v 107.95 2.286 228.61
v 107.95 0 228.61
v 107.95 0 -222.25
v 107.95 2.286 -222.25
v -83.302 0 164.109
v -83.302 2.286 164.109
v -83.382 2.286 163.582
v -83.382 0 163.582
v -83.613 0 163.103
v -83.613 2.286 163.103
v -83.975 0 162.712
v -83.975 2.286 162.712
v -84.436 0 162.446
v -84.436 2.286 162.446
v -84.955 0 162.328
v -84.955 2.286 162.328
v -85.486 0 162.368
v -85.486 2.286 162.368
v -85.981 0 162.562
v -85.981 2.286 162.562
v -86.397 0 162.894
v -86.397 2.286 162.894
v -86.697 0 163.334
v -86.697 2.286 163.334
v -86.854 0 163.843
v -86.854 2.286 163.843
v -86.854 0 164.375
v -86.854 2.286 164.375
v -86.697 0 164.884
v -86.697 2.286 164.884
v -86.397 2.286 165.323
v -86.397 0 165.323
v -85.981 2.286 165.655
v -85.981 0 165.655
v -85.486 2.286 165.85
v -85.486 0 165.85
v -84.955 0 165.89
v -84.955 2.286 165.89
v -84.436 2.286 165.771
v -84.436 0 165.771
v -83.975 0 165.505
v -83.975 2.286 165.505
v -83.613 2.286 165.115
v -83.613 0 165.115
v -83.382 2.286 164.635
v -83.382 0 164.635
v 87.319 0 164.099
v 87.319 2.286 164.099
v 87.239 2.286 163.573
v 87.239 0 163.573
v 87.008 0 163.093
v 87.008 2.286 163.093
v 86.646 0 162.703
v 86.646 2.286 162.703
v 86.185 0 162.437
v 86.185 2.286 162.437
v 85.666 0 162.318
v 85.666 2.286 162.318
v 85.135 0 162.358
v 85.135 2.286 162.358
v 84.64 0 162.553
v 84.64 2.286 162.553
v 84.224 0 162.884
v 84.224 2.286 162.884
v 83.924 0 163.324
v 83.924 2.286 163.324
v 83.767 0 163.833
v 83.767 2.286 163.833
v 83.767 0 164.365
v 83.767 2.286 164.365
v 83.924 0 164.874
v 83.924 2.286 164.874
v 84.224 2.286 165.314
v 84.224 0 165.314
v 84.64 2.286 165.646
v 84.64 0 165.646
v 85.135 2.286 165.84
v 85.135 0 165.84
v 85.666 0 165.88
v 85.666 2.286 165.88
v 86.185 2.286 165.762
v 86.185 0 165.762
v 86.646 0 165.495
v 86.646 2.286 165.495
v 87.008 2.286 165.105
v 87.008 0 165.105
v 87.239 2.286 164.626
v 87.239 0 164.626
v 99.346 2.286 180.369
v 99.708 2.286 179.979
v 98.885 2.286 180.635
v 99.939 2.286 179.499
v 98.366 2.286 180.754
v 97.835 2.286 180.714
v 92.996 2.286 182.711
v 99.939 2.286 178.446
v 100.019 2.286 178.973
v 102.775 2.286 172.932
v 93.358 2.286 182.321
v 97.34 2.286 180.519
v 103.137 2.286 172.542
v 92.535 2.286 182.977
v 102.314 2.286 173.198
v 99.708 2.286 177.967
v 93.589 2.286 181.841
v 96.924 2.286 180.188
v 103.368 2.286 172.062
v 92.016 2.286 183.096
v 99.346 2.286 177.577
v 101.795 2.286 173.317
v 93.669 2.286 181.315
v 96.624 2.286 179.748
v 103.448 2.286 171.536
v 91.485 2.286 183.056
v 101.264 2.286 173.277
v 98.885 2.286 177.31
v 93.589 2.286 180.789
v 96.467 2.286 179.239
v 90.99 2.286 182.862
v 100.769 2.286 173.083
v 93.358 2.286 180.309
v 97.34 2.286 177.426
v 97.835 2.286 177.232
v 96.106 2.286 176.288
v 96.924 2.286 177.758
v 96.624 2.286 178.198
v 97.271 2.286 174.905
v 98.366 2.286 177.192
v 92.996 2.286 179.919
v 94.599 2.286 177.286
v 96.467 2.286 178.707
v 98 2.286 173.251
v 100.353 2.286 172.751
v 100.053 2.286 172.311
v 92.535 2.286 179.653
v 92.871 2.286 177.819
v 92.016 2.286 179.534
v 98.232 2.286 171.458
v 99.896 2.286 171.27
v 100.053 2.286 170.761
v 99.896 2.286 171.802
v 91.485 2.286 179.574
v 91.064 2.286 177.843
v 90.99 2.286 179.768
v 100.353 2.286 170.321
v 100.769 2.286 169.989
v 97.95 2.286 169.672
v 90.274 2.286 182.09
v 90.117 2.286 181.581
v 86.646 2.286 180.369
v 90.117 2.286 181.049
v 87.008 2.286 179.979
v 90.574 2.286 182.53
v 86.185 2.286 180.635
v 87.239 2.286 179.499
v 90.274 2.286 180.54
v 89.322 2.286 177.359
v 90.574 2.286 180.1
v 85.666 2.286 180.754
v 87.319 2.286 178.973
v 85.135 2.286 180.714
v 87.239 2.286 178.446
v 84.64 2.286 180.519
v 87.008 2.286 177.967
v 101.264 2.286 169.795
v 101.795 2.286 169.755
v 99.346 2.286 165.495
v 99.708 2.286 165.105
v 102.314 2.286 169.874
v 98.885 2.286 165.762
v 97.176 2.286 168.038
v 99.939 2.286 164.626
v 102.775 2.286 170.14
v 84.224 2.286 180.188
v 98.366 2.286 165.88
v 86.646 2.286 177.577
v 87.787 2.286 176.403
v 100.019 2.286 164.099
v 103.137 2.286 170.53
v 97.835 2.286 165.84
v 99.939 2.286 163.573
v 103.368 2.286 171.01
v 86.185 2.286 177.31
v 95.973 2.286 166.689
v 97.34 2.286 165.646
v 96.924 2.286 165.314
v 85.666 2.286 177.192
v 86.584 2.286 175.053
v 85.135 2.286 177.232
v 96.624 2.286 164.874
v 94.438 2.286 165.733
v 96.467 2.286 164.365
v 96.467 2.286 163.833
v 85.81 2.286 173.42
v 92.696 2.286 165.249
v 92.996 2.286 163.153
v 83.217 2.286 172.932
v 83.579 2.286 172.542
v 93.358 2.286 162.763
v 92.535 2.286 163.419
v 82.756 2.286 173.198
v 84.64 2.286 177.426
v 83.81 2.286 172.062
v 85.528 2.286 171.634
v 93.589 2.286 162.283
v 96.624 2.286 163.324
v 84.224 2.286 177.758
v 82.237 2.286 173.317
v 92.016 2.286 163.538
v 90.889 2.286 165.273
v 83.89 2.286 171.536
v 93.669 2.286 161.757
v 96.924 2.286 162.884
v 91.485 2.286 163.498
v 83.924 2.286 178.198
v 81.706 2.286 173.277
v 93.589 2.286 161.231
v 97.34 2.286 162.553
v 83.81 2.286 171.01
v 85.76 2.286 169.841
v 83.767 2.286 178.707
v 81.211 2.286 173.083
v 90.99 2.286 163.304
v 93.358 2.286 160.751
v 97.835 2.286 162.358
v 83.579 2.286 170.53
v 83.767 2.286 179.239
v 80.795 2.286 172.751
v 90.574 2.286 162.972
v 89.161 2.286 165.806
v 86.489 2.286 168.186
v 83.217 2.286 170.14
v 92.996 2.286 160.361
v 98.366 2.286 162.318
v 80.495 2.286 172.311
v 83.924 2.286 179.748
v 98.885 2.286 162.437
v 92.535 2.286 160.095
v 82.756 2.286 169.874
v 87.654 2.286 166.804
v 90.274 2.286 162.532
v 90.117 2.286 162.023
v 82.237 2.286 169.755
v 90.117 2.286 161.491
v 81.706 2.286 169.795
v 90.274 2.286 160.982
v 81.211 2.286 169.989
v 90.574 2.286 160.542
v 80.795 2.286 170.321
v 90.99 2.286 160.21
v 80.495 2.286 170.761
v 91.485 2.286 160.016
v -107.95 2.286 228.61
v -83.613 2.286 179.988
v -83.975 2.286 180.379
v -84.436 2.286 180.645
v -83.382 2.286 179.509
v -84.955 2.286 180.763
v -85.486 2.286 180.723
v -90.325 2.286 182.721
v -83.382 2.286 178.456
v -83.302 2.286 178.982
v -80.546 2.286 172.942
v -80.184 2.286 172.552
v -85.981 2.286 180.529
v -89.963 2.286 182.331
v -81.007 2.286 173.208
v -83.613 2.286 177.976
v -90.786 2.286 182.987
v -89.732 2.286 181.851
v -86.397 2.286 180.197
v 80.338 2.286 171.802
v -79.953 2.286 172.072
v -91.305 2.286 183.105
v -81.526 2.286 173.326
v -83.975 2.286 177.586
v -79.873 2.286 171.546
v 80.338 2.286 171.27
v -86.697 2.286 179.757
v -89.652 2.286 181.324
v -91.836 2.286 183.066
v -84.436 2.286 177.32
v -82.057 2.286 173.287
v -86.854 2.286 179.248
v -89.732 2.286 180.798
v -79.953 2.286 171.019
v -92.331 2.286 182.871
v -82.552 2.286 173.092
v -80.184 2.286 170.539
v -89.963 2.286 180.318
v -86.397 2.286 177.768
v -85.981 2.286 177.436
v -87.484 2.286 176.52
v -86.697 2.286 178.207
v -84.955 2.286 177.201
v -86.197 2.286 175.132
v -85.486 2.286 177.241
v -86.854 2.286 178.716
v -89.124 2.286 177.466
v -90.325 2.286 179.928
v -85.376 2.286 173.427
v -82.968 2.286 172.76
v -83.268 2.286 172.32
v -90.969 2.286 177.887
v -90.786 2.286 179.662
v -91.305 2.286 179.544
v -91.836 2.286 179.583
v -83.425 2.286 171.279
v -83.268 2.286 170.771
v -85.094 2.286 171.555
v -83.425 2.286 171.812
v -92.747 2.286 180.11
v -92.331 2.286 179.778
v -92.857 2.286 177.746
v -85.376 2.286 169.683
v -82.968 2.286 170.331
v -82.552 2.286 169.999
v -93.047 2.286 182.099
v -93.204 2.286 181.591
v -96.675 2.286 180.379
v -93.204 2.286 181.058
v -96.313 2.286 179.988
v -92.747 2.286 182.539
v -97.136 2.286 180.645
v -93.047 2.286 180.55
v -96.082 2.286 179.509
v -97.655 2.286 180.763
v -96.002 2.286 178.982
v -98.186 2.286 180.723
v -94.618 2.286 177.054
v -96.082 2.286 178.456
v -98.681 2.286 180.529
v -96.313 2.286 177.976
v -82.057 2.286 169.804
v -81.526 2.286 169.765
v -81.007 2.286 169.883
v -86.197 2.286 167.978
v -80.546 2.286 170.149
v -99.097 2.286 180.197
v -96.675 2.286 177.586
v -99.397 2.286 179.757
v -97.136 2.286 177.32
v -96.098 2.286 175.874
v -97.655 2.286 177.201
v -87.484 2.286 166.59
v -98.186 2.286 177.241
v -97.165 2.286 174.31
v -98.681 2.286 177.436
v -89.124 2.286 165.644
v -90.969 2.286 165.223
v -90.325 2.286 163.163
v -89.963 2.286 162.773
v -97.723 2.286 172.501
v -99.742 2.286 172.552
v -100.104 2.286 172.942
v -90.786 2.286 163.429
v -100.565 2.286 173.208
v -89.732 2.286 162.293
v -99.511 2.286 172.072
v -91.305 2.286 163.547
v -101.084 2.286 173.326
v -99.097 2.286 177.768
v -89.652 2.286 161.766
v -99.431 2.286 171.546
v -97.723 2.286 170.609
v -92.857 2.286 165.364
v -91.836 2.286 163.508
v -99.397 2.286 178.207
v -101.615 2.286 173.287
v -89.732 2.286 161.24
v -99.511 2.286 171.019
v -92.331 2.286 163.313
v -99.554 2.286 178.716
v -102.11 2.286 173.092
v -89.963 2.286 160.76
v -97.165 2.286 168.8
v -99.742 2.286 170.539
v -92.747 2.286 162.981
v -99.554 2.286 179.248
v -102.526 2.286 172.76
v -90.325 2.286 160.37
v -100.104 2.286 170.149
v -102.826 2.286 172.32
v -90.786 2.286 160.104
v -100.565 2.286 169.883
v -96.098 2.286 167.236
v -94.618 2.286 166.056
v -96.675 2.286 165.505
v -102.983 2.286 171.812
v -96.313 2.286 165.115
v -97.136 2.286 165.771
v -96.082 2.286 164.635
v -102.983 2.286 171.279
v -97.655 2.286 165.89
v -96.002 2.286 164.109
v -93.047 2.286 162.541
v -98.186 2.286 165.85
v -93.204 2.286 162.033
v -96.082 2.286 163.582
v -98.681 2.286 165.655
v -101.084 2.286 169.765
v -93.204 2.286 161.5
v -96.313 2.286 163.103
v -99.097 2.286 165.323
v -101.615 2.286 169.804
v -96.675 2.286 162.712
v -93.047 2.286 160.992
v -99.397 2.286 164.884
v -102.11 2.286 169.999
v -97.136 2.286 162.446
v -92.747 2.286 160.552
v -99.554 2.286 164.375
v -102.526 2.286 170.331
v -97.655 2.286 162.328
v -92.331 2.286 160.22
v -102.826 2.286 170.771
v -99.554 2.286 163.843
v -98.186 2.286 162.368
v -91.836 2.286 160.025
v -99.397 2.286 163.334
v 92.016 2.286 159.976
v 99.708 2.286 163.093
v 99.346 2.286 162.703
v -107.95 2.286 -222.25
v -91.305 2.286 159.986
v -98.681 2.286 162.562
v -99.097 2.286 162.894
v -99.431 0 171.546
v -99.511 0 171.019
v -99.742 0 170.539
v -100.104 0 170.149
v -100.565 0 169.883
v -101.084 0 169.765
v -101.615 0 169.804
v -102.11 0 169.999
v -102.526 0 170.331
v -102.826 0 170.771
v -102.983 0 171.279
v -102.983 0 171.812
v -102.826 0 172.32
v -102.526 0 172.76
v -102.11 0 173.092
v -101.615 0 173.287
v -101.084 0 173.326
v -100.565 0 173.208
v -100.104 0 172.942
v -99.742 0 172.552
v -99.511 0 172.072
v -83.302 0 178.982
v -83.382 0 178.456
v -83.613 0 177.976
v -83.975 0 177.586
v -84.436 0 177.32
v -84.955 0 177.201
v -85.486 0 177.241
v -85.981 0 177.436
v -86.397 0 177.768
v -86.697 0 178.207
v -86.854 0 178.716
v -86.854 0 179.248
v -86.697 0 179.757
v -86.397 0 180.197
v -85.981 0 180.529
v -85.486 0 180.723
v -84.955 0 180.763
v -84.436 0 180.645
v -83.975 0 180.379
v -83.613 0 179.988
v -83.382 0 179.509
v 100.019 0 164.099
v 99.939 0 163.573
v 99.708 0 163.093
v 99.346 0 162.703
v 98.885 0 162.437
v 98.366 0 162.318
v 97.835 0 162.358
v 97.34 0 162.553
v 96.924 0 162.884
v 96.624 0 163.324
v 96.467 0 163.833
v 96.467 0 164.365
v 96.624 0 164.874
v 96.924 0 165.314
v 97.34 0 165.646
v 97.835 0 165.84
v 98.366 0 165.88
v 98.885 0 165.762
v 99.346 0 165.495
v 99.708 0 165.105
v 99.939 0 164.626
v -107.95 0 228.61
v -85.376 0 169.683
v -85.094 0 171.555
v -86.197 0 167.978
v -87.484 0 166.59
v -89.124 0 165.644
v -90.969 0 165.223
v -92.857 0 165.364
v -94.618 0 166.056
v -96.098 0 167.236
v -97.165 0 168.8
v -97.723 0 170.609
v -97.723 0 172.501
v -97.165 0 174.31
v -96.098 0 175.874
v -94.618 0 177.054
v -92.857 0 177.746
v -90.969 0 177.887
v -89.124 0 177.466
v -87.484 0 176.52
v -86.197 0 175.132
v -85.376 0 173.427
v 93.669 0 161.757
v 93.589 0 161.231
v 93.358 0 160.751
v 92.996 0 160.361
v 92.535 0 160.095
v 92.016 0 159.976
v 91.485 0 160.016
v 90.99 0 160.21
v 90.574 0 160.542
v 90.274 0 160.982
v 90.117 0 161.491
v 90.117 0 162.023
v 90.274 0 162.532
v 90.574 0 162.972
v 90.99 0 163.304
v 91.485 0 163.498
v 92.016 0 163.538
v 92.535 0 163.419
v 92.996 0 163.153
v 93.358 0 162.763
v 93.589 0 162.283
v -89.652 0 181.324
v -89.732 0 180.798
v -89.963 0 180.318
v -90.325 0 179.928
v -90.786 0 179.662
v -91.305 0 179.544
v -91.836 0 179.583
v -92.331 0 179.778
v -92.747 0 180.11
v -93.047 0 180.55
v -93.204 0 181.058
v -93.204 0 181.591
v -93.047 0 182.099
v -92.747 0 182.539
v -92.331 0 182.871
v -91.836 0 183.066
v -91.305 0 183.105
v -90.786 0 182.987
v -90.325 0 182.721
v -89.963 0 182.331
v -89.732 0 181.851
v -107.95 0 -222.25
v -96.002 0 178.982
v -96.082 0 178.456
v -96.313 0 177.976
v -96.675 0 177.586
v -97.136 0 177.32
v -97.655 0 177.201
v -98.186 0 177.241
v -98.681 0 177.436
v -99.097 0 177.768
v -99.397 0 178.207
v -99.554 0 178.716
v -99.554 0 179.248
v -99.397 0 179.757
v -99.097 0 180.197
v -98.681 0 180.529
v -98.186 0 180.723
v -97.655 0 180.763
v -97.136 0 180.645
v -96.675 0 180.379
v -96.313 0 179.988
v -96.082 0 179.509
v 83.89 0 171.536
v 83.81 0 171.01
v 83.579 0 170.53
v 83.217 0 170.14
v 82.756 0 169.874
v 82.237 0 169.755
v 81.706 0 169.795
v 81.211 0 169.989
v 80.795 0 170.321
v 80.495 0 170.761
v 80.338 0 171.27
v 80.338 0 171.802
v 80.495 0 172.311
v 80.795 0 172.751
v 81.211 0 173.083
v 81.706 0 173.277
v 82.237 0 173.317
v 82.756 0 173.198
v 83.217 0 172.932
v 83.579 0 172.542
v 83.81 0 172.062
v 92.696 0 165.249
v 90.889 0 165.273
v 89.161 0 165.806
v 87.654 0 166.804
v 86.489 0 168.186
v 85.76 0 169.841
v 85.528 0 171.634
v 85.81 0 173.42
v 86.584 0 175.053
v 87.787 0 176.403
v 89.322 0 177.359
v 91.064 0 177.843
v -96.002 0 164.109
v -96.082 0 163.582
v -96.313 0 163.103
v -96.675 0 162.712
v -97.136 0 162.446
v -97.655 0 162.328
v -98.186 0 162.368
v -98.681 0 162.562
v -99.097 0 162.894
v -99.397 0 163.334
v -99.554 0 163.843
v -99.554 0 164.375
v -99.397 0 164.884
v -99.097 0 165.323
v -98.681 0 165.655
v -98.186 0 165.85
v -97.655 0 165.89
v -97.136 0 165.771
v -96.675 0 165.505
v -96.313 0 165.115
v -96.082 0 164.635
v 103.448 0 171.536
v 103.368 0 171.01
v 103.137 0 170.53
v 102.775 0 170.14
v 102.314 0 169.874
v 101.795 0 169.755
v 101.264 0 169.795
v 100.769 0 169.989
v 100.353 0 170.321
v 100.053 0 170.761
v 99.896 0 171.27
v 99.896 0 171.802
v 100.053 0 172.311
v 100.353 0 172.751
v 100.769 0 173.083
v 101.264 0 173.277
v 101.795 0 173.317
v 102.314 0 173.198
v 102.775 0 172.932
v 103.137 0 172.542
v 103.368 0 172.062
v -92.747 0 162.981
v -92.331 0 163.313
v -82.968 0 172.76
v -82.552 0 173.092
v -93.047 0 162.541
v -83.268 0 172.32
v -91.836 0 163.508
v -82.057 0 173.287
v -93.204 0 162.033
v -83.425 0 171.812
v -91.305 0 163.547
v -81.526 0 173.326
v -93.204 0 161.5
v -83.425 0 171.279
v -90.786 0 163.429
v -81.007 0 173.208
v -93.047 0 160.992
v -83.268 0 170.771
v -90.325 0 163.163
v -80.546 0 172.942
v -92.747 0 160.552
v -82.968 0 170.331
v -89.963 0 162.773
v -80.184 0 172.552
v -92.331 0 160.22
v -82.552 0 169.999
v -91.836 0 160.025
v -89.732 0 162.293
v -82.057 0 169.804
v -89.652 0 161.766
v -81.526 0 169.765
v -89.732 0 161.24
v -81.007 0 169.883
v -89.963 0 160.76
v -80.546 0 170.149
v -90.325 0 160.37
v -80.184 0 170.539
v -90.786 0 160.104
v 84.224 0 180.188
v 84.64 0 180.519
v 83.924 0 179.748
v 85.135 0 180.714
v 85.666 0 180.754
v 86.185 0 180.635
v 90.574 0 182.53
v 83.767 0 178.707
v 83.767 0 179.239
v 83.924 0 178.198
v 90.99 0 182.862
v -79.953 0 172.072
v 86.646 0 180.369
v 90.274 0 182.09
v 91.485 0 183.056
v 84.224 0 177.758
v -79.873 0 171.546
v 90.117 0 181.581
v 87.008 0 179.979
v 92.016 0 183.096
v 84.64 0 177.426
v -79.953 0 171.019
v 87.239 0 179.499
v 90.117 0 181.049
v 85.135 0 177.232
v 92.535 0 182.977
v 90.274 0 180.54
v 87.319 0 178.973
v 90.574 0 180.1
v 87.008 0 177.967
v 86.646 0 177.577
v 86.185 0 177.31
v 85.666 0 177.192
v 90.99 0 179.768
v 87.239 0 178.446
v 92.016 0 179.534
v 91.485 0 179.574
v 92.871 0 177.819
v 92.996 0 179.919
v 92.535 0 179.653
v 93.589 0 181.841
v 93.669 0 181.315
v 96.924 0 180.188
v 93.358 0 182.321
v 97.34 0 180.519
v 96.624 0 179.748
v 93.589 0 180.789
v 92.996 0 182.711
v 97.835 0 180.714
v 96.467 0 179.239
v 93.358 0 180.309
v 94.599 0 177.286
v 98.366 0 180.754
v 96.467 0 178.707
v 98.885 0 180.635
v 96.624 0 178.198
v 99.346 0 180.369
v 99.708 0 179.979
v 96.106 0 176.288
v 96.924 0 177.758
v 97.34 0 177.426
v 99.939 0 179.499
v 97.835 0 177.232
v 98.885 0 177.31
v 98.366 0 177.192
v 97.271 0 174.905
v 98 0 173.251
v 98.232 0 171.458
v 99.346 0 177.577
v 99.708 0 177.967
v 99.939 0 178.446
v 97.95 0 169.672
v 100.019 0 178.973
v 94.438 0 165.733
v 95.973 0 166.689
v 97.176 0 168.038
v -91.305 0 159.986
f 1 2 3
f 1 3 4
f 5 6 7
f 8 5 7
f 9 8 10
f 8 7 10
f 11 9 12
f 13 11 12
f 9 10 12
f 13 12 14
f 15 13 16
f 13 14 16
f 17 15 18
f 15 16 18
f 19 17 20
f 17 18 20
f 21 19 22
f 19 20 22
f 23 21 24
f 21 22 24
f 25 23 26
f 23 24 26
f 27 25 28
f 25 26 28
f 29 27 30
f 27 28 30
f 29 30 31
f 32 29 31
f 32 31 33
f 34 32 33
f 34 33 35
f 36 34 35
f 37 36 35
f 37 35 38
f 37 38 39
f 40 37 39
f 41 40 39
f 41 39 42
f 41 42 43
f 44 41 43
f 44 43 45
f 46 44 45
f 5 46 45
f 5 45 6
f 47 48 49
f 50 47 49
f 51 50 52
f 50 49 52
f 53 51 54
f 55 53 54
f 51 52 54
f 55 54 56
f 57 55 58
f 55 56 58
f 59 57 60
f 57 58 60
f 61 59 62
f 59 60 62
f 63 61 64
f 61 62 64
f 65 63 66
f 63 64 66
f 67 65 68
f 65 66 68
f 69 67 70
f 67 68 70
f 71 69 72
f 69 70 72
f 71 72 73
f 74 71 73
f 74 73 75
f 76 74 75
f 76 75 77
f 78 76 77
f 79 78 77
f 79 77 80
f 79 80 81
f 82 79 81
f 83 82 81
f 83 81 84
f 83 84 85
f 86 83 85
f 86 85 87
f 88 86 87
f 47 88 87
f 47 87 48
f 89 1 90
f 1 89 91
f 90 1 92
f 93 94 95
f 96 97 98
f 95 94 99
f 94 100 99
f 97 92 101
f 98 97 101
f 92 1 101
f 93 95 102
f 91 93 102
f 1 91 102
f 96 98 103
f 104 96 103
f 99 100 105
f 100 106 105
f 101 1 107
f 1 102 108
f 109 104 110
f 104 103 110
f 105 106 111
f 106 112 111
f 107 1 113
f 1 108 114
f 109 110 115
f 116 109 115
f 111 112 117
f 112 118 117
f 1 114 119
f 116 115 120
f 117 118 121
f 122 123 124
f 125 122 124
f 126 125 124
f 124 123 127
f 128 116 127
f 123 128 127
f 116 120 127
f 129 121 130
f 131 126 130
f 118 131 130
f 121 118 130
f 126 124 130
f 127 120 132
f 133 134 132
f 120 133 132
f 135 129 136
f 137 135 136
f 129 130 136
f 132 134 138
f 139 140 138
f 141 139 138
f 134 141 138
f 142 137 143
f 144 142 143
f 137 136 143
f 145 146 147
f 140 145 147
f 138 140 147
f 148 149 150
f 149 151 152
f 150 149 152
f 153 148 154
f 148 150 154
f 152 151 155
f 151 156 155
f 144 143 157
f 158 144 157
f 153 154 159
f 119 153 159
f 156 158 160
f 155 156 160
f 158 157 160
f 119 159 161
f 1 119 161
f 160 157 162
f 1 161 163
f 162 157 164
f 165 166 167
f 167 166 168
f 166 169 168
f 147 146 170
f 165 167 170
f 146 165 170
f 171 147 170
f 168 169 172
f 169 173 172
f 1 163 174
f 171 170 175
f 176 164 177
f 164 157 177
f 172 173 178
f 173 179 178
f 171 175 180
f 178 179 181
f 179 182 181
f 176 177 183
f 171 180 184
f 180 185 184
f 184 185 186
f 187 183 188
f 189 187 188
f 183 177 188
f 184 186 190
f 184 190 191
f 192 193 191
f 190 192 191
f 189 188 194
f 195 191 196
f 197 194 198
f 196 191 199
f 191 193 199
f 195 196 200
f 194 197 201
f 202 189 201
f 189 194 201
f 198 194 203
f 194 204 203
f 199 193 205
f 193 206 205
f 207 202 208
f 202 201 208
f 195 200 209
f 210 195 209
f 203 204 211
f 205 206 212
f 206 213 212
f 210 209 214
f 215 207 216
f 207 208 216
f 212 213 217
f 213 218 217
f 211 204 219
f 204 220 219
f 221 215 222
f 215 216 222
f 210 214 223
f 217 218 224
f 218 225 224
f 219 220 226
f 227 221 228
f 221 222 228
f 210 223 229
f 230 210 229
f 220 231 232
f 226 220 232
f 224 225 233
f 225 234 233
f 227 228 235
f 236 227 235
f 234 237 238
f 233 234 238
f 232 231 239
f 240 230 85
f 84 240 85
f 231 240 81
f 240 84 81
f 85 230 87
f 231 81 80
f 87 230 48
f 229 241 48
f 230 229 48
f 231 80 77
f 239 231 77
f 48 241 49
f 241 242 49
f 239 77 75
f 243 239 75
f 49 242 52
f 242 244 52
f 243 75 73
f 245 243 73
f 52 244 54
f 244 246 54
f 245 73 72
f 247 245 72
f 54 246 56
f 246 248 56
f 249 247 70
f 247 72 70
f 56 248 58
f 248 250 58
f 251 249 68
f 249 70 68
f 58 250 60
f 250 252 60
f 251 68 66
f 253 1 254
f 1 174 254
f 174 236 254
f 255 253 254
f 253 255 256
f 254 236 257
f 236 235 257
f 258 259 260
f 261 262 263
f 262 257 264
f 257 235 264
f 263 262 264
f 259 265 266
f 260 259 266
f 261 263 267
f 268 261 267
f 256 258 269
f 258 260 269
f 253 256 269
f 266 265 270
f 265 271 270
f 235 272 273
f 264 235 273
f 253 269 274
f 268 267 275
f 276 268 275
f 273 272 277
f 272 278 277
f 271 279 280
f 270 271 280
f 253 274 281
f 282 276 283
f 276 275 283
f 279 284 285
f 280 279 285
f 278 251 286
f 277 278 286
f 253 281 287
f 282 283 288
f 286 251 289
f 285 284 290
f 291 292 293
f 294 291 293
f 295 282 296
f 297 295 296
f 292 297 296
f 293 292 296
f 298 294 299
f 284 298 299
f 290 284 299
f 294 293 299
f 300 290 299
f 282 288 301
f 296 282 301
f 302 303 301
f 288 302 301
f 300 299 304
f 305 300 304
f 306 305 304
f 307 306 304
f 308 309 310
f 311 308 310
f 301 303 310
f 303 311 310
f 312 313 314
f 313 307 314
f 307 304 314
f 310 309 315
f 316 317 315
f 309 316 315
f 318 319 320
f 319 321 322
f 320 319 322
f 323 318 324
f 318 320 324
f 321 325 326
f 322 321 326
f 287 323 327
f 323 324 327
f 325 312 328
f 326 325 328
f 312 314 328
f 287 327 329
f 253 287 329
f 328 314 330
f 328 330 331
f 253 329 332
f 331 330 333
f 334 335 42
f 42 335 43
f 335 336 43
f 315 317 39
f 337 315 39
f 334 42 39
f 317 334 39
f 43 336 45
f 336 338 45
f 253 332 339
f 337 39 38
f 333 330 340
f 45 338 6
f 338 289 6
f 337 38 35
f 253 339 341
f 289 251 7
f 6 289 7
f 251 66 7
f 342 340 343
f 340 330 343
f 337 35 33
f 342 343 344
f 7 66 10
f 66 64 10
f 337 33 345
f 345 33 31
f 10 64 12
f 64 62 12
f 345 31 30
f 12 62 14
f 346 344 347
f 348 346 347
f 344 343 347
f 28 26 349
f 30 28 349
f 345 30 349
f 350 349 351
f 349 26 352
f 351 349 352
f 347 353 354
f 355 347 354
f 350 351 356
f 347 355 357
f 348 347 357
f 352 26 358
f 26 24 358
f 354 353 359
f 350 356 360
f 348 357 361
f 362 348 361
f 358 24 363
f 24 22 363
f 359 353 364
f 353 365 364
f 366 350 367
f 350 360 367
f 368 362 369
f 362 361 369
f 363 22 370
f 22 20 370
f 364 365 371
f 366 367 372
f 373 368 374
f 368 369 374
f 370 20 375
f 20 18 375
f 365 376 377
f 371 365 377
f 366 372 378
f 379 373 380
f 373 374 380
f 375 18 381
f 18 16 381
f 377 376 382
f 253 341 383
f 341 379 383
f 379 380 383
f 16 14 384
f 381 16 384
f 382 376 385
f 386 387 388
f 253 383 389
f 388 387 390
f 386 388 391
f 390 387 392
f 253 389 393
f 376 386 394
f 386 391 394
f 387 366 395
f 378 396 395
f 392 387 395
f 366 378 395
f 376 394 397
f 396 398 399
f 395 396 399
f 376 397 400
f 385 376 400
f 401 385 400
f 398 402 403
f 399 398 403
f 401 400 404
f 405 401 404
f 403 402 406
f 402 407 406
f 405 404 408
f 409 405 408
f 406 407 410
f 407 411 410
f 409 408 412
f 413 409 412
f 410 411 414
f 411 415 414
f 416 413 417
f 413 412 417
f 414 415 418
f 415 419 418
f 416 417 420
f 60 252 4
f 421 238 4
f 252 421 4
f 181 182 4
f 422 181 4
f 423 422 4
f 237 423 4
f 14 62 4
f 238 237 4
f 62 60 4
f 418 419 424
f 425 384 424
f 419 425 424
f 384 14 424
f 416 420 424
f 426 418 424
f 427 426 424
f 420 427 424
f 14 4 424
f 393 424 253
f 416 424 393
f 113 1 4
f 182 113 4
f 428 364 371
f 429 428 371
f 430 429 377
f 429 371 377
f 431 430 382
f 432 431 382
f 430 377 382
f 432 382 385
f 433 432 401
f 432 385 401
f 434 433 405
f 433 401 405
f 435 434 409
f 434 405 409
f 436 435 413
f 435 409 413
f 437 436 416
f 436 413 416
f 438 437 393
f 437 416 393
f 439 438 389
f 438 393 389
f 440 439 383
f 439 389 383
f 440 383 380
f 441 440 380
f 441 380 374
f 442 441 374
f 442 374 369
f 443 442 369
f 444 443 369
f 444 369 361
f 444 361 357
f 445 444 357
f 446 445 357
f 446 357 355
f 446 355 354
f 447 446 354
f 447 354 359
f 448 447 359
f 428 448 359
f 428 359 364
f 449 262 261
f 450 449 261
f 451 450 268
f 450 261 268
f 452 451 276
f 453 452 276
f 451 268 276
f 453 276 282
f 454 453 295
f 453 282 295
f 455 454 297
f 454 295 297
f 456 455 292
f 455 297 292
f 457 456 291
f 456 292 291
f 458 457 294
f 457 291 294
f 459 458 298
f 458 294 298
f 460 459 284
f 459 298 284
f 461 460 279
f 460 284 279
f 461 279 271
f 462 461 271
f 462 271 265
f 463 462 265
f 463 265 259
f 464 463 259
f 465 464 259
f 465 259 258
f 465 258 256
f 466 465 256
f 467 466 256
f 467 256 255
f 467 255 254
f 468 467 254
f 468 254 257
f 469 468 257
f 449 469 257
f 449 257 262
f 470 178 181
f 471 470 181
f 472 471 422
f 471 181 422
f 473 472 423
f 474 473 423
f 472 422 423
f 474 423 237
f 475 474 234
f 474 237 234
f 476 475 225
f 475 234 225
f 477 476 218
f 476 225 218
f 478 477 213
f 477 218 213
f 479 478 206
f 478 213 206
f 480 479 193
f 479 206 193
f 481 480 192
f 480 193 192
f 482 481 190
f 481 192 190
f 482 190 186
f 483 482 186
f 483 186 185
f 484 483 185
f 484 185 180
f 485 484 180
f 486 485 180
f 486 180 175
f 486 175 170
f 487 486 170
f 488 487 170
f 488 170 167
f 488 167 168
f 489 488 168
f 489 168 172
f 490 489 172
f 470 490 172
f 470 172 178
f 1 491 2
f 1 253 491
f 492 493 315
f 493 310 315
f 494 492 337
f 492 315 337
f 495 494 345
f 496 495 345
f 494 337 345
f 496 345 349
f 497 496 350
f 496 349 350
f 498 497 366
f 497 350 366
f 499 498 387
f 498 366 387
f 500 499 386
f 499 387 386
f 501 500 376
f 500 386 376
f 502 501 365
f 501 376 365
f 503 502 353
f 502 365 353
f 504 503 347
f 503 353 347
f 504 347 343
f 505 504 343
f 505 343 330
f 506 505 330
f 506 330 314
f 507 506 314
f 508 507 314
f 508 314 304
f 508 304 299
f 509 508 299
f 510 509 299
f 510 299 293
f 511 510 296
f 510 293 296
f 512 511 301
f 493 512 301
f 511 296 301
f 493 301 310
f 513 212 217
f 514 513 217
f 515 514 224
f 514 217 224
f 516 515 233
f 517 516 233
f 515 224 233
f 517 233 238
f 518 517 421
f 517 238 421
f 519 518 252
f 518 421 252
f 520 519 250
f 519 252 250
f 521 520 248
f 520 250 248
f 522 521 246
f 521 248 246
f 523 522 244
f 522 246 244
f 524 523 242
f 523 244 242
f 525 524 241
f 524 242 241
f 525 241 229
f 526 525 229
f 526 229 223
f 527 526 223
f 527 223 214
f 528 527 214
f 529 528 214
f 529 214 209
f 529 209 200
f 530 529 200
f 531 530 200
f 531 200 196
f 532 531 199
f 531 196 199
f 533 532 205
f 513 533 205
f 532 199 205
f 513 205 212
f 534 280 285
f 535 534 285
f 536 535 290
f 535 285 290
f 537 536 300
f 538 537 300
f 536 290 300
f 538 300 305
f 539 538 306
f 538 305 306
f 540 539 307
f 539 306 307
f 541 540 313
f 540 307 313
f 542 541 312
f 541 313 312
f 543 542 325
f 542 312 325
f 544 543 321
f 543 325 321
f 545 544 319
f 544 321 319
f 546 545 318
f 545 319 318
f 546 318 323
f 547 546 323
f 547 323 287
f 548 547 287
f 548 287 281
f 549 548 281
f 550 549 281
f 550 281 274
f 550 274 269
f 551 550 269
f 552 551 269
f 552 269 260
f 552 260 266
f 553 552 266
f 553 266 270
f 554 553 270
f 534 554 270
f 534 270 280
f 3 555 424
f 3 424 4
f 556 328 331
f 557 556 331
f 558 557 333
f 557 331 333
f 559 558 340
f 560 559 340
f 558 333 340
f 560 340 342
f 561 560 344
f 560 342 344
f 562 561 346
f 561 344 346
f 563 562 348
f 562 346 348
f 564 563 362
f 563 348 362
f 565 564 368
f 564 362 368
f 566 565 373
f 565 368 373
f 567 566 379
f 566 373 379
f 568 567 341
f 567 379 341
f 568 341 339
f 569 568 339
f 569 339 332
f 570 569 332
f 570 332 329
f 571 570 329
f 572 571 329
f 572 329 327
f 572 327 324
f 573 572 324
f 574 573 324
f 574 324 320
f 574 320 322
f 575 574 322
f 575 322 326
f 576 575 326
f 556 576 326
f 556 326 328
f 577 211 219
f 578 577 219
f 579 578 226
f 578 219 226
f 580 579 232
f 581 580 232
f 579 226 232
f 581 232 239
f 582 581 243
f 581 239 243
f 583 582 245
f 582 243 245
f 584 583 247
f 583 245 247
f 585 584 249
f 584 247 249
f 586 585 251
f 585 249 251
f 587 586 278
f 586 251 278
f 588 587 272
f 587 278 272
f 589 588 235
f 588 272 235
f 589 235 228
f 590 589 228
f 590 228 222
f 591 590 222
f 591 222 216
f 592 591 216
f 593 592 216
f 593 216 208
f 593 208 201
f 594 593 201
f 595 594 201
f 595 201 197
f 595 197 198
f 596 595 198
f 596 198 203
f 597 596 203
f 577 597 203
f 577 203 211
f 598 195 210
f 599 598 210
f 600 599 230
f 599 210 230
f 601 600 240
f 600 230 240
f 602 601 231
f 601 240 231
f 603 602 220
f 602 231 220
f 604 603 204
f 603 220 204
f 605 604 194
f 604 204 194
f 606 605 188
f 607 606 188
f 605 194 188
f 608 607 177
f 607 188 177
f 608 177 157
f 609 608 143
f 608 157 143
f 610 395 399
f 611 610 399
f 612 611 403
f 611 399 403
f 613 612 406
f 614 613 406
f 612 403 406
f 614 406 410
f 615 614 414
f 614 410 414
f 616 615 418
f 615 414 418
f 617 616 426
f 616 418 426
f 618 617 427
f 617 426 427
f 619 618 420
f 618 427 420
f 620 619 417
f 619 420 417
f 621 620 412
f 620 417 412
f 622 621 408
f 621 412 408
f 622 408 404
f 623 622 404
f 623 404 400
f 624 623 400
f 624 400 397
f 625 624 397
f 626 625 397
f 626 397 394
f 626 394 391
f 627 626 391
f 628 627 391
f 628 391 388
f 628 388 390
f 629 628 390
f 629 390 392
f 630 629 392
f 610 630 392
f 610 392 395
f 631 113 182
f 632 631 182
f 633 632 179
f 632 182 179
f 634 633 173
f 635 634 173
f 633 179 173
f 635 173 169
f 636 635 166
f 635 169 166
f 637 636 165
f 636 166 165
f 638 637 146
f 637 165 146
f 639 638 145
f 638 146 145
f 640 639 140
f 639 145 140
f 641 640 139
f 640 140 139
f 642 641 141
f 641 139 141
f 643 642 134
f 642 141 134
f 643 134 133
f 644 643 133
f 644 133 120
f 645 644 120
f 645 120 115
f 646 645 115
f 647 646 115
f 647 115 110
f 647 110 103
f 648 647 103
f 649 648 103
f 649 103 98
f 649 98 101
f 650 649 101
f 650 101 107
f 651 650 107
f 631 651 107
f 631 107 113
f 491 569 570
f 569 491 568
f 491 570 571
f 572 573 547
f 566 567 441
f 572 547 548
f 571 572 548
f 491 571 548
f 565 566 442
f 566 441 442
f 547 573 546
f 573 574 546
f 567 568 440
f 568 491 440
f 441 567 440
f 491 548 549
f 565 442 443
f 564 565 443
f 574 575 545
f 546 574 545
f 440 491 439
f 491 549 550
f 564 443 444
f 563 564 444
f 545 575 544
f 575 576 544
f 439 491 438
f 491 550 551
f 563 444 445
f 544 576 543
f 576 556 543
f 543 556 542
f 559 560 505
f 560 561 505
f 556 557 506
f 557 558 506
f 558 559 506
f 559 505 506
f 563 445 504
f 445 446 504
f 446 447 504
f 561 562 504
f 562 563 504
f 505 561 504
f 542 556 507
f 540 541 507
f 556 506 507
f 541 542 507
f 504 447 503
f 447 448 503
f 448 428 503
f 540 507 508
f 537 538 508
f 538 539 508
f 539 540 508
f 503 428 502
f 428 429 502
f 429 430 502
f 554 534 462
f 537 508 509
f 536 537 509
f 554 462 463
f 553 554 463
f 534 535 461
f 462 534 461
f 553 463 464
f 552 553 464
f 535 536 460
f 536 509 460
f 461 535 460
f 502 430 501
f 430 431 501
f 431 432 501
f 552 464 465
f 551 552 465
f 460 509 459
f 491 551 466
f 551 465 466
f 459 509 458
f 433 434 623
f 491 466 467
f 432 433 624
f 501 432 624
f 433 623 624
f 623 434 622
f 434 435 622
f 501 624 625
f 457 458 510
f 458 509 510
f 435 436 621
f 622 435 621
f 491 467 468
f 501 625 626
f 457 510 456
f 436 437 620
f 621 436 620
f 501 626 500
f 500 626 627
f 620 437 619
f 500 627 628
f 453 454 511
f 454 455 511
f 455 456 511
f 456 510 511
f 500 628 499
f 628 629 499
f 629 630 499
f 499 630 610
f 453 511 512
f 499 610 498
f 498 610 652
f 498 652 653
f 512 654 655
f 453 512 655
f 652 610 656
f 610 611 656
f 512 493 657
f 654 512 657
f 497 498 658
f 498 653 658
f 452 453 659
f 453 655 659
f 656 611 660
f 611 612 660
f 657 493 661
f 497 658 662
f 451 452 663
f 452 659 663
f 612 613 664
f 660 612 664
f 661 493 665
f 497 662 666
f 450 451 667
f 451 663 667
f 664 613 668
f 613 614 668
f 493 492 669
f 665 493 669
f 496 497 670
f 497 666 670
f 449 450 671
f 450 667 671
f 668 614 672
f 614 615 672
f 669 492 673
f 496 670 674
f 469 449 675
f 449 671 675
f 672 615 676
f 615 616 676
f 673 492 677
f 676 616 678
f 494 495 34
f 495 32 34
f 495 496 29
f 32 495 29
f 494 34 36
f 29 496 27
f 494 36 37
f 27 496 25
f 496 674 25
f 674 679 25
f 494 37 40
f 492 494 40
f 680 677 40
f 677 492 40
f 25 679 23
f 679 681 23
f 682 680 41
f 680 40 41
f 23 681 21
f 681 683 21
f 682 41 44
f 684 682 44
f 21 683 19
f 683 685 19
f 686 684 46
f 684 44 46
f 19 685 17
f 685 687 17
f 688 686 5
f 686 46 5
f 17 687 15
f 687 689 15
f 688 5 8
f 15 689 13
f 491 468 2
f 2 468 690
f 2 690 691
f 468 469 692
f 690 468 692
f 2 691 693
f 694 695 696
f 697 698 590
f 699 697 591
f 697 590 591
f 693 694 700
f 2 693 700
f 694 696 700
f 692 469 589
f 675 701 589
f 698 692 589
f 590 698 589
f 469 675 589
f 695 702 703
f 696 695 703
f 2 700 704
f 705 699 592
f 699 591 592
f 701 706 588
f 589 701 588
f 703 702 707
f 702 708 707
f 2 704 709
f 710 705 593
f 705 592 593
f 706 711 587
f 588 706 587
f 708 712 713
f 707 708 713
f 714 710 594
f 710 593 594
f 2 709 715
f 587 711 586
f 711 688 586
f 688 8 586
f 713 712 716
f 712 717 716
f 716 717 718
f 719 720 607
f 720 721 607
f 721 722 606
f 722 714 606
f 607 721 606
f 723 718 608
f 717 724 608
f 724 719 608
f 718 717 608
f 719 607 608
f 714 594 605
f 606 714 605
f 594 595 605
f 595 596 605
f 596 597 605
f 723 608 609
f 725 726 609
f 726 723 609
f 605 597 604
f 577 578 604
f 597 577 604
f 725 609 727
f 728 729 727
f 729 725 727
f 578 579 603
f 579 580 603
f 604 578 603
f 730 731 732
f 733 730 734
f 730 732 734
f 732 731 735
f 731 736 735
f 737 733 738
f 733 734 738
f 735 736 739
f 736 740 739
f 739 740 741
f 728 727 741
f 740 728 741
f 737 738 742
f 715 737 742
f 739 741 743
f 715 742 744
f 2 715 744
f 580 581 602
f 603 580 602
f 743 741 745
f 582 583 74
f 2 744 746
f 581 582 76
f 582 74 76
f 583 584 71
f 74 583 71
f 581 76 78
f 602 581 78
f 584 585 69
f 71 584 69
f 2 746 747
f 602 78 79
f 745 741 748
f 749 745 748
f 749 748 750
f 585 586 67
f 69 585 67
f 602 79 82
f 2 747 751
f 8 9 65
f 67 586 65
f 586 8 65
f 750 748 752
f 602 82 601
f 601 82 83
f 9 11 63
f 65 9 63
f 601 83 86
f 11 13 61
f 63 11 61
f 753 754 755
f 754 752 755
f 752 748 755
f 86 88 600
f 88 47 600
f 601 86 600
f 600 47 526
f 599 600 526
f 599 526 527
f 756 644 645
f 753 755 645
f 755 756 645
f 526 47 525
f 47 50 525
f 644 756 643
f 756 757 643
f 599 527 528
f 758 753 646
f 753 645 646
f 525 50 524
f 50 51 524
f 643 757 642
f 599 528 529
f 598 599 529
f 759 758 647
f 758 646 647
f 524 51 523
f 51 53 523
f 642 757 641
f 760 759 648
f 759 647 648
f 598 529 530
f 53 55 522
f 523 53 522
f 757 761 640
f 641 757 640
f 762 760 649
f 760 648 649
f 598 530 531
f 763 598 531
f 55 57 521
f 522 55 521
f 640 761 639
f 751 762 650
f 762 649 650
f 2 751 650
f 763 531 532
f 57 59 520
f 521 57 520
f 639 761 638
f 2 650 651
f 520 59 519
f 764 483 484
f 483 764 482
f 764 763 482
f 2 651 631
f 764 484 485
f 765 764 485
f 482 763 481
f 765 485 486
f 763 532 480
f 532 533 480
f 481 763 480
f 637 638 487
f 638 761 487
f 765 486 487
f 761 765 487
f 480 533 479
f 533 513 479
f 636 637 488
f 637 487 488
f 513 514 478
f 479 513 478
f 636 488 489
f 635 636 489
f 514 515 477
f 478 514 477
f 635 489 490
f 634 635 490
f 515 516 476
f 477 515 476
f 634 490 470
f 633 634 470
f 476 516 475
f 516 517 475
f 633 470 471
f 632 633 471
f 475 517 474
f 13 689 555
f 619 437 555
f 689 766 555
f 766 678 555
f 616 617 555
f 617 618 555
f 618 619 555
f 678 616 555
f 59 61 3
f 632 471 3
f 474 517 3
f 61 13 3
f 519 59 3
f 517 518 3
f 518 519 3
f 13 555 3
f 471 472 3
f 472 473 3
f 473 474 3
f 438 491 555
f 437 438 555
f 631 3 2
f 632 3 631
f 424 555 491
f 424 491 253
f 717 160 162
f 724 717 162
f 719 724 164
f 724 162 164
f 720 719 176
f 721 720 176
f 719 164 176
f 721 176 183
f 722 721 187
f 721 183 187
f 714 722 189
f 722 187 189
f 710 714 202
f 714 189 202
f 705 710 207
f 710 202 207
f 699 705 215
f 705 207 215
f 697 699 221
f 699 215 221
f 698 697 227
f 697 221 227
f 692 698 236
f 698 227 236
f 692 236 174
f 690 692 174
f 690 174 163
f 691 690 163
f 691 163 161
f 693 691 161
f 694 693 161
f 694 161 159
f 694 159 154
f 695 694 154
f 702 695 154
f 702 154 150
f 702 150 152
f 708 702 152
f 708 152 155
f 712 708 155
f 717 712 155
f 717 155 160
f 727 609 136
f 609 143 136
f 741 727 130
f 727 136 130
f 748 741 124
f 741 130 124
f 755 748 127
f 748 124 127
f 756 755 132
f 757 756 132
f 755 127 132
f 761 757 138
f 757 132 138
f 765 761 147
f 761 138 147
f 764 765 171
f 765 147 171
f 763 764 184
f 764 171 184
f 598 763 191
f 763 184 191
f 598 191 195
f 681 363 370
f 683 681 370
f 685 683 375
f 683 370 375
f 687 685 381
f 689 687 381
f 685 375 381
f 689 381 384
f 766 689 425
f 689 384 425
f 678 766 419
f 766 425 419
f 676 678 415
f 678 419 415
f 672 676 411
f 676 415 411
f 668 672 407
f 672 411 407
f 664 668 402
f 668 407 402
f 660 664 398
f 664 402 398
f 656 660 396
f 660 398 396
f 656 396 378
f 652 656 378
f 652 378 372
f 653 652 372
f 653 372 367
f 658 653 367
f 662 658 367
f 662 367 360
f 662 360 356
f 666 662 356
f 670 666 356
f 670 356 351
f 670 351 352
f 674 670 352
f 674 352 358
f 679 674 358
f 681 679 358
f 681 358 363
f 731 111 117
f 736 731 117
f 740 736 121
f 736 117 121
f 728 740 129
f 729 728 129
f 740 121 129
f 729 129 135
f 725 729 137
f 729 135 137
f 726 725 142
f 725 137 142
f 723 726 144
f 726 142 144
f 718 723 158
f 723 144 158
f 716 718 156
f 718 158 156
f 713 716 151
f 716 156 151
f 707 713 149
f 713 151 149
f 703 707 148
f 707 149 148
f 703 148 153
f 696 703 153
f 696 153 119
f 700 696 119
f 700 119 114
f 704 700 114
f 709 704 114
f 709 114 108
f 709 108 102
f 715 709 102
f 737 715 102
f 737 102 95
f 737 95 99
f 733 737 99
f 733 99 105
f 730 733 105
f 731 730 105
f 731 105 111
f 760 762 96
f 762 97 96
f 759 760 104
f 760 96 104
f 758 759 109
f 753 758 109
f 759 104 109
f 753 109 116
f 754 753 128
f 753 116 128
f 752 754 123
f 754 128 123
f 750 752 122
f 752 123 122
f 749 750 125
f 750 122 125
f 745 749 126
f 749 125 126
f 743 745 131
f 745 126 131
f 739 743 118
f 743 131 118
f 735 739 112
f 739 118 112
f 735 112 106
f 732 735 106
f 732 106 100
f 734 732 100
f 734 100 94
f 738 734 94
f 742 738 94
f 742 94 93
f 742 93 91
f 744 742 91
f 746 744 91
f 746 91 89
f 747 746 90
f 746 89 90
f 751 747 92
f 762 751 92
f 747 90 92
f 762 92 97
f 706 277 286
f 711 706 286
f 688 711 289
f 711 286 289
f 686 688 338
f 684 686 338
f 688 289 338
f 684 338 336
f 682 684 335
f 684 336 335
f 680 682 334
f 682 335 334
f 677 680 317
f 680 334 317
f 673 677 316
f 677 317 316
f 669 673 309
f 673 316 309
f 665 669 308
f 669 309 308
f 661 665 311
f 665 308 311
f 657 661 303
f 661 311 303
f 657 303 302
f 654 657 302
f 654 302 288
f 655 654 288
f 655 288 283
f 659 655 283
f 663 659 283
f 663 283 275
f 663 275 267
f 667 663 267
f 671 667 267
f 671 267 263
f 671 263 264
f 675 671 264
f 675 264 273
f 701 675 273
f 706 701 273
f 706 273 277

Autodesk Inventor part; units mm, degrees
ref_plane "YZ Plane" through (0, 0, 0) normal (1, 0, 0) x (0, 1, 0)
ref_plane "XZ Plane" through (0, 0, 0) normal (0, 1, 0) x (-1, 0, 0)
ref_plane "XY Plane" through (0, 0, 0) normal (0, 0, 1) x (1, 0, 0)
sketch "Sketch1" plane through (0, 0, 0) normal (0, 1, 0) x (-1, 0, 0)
  line L0 (-107.95, 222.25) -> (107.95, 222.25)
  line L1 (107.95, 222.25) -> (107.95, -222.25)
  line L2 (107.95, -222.25) -> (-107.95, -222.25)
  line L3 (-107.95, -222.25) -> (-107.95, 222.25)
  line L4 (-107.95, 222.25) -> (107.95, -222.25) construction
  line L5 (107.95, 222.25) -> (-107.95, -222.25) construction
  point P0 (0, 0)
  dimension "d0" = 215.9
  dimension "d1" = 444.5
extrude "Extrusion1" add sketch "Sketch1" along normal blind 2.286
sketch "Sketch2" plane through (0, 2.286, 0) normal (0, 1, 0) x (1, 0, 0)
  circle A0 centre (-91.4435, -171.555) radius 6.35
  circle A1 centre (91.8827, -171.5462) radius 6.35
  circle A2 centre (-91.4381, -181.3245) radius 1.7859
  circle A3 centre (-91.4381, -161.7665) radius 1.7859
  circle A4 centre (-81.6591, -171.5455) radius 1.7859
  circle A5 centre (-101.2171, -171.5455) radius 1.7859
  circle A6 centre (-97.7881, -164.1087) radius 1.7859
  circle A7 centre (-97.7881, -178.9823) radius 1.7859
  circle A8 centre (-85.0881, -164.1087) radius 1.7859
  circle A9 centre (-85.0881, -178.9823) radius 1.7859
  circle A10 centre (-91.4435, -171.555) radius 6.35
  circle A11 centre (-91.4381, -181.3245) radius 1.7859
  circle A12 centre (-91.4381, -161.7665) radius 1.7859
  circle A13 centre (-81.6591, -171.5455) radius 1.7859
  circle A14 centre (-101.2171, -171.5455) radius 1.7859
  circle A15 centre (-97.7881, -164.1087) radius 1.7859
  circle A16 centre (-97.7881, -178.9823) radius 1.7859
  circle A17 centre (-85.0881, -164.1087) radius 1.7859
  circle A18 centre (-85.0881, -178.9823) radius 1.7859
  circle A19 centre (91.8773, -171.5455) radius 6.35
  circle A20 centre (91.8827, -181.315) radius 1.7859
  circle A21 centre (91.8827, -161.757) radius 1.7859
  circle A22 centre (101.6617, -171.536) radius 1.7859
  circle A23 centre (82.1037, -171.536) radius 1.7859
  circle A24 centre (85.5327, -164.0992) radius 1.7859
  circle A25 centre (98.2327, -164.0992) radius 1.7859
  circle A26 centre (98.2327, -178.9728) radius 1.7859
  circle A27 centre (85.5327, -164.0992) radius 1.7859
  circle A28 centre (82.1037, -171.536) radius 1.7859
  circle A29 centre (85.5327, -178.9728) radius 1.7859
  point P0 (0, 0)
  point P1 (92.7251, -165.2523)
  point P2 (91.0349, -177.8394)
  point P3 (-91.4381, -183.1104)
  dimension "d32" = 3.5719
  dimension "d5" = 12.7
  dimension "d6" = 12.7
  dimension "d23" = 3.5719
  dimension "d24" = 3.5719
  dimension "d25" = 3.5719
  dimension "d26" = 3.5719
  dimension "d27" = 3.5719
  dimension "d28" = 3.5719
  dimension "d29" = 3.5719
  dimension "d30" = 3.5719
  dimension "d31" = 12.7
  dimension "d33" = 3.5719
  dimension "d34" = 3.5719
  dimension "d35" = 3.5719
  dimension "d36" = 3.5719
  dimension "d37" = 3.5719
  dimension "d38" = 3.5719
  dimension "d39" = 3.5719
  dimension "d49" = 12.7
  dimension "d50" = 3.5719
  dimension "d51" = 3.5719
  dimension "d52" = 3.5719
  dimension "d53" = 3.5719
  dimension "d54" = 3.5719
  dimension "d56" = 3.5719
  dimension "d57" = 3.5719
  dimension "d62" = 3.5719
  dimension "d63" = 3.5719
  dimension "d64" = 3.5719
extrude "Extrusion2" cut sketch "Sketch2" against normal blind 2.286
sketch "Sketch3" plane through (-107.95, 0, 222.25) normal (0, 0, 1) x (1, 0, 0)
  line L0 (215.9, 2.286) -> (0, 2.286) projected
  line L1 (0, 0) -> (0, 2.286) projected
  line L2 (215.9, 2.286) -> (0, 2.286)
  line L3 (0, 2.286) -> (0, 0)
  line L4 (0, 0) -> (215.9, 0)
  line L5 (215.9, 0) -> (215.9, 2.286)
  point P0 (107.95, 0)
extrude "Extrusion3" add sketch "Sketch3" along normal blind 6.3602
properties part number "baseplate"
